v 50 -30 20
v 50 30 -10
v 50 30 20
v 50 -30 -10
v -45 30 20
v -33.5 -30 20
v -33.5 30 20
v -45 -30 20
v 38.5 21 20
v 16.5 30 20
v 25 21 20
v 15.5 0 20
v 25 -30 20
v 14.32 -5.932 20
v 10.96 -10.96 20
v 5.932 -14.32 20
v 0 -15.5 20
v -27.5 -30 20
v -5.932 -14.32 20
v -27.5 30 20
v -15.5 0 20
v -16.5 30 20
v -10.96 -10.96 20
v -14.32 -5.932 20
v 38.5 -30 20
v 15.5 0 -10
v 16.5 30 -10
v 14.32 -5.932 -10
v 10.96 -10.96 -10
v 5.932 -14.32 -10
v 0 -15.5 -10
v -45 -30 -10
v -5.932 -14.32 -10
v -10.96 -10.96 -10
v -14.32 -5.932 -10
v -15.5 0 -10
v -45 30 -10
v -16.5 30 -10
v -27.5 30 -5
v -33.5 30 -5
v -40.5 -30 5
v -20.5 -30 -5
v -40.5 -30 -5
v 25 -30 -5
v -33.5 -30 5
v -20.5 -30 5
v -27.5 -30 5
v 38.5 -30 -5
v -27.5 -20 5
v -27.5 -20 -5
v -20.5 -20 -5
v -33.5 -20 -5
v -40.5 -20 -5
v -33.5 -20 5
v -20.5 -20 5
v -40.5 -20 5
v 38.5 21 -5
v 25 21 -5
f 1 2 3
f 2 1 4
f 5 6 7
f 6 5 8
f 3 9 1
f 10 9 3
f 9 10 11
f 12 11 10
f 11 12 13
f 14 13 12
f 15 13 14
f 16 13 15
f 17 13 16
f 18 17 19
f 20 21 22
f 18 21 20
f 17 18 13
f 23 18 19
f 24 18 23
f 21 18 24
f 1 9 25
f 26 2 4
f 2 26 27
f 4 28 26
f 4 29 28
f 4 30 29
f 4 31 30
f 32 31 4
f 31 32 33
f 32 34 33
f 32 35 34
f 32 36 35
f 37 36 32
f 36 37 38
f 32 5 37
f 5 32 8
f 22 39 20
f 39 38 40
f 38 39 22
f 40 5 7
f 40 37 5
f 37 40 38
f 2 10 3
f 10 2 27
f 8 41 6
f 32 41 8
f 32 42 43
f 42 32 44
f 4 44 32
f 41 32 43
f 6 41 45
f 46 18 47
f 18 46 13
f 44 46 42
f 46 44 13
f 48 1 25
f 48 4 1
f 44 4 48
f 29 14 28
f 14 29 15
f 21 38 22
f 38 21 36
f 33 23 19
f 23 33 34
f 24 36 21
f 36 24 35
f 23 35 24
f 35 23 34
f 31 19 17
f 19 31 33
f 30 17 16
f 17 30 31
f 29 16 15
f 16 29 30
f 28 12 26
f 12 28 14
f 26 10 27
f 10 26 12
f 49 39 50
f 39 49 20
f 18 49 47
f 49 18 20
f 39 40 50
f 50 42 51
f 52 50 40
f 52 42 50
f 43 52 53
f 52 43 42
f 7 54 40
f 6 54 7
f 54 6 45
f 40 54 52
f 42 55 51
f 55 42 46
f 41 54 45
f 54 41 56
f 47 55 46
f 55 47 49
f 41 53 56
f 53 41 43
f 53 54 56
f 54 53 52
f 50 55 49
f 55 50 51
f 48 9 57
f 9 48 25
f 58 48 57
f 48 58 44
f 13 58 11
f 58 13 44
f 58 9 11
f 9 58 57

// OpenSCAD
$fn=16;

difference() {
    translate([-45,-30,-10]) cube([95,60,30]);
    hull() {
        cylinder(40, d=31, center = true);
        translate([0, 30, 0]) cylinder(40, d=33, center = true);
    };
    translate([-33.5,-40,-5]) cube([6, 80, 40]);
    translate([-40.5,-40,-5]) cube([20, 20, 10]);
    translate([25, -70,-5]) cube([13.5, 91, 31 ]);
}
